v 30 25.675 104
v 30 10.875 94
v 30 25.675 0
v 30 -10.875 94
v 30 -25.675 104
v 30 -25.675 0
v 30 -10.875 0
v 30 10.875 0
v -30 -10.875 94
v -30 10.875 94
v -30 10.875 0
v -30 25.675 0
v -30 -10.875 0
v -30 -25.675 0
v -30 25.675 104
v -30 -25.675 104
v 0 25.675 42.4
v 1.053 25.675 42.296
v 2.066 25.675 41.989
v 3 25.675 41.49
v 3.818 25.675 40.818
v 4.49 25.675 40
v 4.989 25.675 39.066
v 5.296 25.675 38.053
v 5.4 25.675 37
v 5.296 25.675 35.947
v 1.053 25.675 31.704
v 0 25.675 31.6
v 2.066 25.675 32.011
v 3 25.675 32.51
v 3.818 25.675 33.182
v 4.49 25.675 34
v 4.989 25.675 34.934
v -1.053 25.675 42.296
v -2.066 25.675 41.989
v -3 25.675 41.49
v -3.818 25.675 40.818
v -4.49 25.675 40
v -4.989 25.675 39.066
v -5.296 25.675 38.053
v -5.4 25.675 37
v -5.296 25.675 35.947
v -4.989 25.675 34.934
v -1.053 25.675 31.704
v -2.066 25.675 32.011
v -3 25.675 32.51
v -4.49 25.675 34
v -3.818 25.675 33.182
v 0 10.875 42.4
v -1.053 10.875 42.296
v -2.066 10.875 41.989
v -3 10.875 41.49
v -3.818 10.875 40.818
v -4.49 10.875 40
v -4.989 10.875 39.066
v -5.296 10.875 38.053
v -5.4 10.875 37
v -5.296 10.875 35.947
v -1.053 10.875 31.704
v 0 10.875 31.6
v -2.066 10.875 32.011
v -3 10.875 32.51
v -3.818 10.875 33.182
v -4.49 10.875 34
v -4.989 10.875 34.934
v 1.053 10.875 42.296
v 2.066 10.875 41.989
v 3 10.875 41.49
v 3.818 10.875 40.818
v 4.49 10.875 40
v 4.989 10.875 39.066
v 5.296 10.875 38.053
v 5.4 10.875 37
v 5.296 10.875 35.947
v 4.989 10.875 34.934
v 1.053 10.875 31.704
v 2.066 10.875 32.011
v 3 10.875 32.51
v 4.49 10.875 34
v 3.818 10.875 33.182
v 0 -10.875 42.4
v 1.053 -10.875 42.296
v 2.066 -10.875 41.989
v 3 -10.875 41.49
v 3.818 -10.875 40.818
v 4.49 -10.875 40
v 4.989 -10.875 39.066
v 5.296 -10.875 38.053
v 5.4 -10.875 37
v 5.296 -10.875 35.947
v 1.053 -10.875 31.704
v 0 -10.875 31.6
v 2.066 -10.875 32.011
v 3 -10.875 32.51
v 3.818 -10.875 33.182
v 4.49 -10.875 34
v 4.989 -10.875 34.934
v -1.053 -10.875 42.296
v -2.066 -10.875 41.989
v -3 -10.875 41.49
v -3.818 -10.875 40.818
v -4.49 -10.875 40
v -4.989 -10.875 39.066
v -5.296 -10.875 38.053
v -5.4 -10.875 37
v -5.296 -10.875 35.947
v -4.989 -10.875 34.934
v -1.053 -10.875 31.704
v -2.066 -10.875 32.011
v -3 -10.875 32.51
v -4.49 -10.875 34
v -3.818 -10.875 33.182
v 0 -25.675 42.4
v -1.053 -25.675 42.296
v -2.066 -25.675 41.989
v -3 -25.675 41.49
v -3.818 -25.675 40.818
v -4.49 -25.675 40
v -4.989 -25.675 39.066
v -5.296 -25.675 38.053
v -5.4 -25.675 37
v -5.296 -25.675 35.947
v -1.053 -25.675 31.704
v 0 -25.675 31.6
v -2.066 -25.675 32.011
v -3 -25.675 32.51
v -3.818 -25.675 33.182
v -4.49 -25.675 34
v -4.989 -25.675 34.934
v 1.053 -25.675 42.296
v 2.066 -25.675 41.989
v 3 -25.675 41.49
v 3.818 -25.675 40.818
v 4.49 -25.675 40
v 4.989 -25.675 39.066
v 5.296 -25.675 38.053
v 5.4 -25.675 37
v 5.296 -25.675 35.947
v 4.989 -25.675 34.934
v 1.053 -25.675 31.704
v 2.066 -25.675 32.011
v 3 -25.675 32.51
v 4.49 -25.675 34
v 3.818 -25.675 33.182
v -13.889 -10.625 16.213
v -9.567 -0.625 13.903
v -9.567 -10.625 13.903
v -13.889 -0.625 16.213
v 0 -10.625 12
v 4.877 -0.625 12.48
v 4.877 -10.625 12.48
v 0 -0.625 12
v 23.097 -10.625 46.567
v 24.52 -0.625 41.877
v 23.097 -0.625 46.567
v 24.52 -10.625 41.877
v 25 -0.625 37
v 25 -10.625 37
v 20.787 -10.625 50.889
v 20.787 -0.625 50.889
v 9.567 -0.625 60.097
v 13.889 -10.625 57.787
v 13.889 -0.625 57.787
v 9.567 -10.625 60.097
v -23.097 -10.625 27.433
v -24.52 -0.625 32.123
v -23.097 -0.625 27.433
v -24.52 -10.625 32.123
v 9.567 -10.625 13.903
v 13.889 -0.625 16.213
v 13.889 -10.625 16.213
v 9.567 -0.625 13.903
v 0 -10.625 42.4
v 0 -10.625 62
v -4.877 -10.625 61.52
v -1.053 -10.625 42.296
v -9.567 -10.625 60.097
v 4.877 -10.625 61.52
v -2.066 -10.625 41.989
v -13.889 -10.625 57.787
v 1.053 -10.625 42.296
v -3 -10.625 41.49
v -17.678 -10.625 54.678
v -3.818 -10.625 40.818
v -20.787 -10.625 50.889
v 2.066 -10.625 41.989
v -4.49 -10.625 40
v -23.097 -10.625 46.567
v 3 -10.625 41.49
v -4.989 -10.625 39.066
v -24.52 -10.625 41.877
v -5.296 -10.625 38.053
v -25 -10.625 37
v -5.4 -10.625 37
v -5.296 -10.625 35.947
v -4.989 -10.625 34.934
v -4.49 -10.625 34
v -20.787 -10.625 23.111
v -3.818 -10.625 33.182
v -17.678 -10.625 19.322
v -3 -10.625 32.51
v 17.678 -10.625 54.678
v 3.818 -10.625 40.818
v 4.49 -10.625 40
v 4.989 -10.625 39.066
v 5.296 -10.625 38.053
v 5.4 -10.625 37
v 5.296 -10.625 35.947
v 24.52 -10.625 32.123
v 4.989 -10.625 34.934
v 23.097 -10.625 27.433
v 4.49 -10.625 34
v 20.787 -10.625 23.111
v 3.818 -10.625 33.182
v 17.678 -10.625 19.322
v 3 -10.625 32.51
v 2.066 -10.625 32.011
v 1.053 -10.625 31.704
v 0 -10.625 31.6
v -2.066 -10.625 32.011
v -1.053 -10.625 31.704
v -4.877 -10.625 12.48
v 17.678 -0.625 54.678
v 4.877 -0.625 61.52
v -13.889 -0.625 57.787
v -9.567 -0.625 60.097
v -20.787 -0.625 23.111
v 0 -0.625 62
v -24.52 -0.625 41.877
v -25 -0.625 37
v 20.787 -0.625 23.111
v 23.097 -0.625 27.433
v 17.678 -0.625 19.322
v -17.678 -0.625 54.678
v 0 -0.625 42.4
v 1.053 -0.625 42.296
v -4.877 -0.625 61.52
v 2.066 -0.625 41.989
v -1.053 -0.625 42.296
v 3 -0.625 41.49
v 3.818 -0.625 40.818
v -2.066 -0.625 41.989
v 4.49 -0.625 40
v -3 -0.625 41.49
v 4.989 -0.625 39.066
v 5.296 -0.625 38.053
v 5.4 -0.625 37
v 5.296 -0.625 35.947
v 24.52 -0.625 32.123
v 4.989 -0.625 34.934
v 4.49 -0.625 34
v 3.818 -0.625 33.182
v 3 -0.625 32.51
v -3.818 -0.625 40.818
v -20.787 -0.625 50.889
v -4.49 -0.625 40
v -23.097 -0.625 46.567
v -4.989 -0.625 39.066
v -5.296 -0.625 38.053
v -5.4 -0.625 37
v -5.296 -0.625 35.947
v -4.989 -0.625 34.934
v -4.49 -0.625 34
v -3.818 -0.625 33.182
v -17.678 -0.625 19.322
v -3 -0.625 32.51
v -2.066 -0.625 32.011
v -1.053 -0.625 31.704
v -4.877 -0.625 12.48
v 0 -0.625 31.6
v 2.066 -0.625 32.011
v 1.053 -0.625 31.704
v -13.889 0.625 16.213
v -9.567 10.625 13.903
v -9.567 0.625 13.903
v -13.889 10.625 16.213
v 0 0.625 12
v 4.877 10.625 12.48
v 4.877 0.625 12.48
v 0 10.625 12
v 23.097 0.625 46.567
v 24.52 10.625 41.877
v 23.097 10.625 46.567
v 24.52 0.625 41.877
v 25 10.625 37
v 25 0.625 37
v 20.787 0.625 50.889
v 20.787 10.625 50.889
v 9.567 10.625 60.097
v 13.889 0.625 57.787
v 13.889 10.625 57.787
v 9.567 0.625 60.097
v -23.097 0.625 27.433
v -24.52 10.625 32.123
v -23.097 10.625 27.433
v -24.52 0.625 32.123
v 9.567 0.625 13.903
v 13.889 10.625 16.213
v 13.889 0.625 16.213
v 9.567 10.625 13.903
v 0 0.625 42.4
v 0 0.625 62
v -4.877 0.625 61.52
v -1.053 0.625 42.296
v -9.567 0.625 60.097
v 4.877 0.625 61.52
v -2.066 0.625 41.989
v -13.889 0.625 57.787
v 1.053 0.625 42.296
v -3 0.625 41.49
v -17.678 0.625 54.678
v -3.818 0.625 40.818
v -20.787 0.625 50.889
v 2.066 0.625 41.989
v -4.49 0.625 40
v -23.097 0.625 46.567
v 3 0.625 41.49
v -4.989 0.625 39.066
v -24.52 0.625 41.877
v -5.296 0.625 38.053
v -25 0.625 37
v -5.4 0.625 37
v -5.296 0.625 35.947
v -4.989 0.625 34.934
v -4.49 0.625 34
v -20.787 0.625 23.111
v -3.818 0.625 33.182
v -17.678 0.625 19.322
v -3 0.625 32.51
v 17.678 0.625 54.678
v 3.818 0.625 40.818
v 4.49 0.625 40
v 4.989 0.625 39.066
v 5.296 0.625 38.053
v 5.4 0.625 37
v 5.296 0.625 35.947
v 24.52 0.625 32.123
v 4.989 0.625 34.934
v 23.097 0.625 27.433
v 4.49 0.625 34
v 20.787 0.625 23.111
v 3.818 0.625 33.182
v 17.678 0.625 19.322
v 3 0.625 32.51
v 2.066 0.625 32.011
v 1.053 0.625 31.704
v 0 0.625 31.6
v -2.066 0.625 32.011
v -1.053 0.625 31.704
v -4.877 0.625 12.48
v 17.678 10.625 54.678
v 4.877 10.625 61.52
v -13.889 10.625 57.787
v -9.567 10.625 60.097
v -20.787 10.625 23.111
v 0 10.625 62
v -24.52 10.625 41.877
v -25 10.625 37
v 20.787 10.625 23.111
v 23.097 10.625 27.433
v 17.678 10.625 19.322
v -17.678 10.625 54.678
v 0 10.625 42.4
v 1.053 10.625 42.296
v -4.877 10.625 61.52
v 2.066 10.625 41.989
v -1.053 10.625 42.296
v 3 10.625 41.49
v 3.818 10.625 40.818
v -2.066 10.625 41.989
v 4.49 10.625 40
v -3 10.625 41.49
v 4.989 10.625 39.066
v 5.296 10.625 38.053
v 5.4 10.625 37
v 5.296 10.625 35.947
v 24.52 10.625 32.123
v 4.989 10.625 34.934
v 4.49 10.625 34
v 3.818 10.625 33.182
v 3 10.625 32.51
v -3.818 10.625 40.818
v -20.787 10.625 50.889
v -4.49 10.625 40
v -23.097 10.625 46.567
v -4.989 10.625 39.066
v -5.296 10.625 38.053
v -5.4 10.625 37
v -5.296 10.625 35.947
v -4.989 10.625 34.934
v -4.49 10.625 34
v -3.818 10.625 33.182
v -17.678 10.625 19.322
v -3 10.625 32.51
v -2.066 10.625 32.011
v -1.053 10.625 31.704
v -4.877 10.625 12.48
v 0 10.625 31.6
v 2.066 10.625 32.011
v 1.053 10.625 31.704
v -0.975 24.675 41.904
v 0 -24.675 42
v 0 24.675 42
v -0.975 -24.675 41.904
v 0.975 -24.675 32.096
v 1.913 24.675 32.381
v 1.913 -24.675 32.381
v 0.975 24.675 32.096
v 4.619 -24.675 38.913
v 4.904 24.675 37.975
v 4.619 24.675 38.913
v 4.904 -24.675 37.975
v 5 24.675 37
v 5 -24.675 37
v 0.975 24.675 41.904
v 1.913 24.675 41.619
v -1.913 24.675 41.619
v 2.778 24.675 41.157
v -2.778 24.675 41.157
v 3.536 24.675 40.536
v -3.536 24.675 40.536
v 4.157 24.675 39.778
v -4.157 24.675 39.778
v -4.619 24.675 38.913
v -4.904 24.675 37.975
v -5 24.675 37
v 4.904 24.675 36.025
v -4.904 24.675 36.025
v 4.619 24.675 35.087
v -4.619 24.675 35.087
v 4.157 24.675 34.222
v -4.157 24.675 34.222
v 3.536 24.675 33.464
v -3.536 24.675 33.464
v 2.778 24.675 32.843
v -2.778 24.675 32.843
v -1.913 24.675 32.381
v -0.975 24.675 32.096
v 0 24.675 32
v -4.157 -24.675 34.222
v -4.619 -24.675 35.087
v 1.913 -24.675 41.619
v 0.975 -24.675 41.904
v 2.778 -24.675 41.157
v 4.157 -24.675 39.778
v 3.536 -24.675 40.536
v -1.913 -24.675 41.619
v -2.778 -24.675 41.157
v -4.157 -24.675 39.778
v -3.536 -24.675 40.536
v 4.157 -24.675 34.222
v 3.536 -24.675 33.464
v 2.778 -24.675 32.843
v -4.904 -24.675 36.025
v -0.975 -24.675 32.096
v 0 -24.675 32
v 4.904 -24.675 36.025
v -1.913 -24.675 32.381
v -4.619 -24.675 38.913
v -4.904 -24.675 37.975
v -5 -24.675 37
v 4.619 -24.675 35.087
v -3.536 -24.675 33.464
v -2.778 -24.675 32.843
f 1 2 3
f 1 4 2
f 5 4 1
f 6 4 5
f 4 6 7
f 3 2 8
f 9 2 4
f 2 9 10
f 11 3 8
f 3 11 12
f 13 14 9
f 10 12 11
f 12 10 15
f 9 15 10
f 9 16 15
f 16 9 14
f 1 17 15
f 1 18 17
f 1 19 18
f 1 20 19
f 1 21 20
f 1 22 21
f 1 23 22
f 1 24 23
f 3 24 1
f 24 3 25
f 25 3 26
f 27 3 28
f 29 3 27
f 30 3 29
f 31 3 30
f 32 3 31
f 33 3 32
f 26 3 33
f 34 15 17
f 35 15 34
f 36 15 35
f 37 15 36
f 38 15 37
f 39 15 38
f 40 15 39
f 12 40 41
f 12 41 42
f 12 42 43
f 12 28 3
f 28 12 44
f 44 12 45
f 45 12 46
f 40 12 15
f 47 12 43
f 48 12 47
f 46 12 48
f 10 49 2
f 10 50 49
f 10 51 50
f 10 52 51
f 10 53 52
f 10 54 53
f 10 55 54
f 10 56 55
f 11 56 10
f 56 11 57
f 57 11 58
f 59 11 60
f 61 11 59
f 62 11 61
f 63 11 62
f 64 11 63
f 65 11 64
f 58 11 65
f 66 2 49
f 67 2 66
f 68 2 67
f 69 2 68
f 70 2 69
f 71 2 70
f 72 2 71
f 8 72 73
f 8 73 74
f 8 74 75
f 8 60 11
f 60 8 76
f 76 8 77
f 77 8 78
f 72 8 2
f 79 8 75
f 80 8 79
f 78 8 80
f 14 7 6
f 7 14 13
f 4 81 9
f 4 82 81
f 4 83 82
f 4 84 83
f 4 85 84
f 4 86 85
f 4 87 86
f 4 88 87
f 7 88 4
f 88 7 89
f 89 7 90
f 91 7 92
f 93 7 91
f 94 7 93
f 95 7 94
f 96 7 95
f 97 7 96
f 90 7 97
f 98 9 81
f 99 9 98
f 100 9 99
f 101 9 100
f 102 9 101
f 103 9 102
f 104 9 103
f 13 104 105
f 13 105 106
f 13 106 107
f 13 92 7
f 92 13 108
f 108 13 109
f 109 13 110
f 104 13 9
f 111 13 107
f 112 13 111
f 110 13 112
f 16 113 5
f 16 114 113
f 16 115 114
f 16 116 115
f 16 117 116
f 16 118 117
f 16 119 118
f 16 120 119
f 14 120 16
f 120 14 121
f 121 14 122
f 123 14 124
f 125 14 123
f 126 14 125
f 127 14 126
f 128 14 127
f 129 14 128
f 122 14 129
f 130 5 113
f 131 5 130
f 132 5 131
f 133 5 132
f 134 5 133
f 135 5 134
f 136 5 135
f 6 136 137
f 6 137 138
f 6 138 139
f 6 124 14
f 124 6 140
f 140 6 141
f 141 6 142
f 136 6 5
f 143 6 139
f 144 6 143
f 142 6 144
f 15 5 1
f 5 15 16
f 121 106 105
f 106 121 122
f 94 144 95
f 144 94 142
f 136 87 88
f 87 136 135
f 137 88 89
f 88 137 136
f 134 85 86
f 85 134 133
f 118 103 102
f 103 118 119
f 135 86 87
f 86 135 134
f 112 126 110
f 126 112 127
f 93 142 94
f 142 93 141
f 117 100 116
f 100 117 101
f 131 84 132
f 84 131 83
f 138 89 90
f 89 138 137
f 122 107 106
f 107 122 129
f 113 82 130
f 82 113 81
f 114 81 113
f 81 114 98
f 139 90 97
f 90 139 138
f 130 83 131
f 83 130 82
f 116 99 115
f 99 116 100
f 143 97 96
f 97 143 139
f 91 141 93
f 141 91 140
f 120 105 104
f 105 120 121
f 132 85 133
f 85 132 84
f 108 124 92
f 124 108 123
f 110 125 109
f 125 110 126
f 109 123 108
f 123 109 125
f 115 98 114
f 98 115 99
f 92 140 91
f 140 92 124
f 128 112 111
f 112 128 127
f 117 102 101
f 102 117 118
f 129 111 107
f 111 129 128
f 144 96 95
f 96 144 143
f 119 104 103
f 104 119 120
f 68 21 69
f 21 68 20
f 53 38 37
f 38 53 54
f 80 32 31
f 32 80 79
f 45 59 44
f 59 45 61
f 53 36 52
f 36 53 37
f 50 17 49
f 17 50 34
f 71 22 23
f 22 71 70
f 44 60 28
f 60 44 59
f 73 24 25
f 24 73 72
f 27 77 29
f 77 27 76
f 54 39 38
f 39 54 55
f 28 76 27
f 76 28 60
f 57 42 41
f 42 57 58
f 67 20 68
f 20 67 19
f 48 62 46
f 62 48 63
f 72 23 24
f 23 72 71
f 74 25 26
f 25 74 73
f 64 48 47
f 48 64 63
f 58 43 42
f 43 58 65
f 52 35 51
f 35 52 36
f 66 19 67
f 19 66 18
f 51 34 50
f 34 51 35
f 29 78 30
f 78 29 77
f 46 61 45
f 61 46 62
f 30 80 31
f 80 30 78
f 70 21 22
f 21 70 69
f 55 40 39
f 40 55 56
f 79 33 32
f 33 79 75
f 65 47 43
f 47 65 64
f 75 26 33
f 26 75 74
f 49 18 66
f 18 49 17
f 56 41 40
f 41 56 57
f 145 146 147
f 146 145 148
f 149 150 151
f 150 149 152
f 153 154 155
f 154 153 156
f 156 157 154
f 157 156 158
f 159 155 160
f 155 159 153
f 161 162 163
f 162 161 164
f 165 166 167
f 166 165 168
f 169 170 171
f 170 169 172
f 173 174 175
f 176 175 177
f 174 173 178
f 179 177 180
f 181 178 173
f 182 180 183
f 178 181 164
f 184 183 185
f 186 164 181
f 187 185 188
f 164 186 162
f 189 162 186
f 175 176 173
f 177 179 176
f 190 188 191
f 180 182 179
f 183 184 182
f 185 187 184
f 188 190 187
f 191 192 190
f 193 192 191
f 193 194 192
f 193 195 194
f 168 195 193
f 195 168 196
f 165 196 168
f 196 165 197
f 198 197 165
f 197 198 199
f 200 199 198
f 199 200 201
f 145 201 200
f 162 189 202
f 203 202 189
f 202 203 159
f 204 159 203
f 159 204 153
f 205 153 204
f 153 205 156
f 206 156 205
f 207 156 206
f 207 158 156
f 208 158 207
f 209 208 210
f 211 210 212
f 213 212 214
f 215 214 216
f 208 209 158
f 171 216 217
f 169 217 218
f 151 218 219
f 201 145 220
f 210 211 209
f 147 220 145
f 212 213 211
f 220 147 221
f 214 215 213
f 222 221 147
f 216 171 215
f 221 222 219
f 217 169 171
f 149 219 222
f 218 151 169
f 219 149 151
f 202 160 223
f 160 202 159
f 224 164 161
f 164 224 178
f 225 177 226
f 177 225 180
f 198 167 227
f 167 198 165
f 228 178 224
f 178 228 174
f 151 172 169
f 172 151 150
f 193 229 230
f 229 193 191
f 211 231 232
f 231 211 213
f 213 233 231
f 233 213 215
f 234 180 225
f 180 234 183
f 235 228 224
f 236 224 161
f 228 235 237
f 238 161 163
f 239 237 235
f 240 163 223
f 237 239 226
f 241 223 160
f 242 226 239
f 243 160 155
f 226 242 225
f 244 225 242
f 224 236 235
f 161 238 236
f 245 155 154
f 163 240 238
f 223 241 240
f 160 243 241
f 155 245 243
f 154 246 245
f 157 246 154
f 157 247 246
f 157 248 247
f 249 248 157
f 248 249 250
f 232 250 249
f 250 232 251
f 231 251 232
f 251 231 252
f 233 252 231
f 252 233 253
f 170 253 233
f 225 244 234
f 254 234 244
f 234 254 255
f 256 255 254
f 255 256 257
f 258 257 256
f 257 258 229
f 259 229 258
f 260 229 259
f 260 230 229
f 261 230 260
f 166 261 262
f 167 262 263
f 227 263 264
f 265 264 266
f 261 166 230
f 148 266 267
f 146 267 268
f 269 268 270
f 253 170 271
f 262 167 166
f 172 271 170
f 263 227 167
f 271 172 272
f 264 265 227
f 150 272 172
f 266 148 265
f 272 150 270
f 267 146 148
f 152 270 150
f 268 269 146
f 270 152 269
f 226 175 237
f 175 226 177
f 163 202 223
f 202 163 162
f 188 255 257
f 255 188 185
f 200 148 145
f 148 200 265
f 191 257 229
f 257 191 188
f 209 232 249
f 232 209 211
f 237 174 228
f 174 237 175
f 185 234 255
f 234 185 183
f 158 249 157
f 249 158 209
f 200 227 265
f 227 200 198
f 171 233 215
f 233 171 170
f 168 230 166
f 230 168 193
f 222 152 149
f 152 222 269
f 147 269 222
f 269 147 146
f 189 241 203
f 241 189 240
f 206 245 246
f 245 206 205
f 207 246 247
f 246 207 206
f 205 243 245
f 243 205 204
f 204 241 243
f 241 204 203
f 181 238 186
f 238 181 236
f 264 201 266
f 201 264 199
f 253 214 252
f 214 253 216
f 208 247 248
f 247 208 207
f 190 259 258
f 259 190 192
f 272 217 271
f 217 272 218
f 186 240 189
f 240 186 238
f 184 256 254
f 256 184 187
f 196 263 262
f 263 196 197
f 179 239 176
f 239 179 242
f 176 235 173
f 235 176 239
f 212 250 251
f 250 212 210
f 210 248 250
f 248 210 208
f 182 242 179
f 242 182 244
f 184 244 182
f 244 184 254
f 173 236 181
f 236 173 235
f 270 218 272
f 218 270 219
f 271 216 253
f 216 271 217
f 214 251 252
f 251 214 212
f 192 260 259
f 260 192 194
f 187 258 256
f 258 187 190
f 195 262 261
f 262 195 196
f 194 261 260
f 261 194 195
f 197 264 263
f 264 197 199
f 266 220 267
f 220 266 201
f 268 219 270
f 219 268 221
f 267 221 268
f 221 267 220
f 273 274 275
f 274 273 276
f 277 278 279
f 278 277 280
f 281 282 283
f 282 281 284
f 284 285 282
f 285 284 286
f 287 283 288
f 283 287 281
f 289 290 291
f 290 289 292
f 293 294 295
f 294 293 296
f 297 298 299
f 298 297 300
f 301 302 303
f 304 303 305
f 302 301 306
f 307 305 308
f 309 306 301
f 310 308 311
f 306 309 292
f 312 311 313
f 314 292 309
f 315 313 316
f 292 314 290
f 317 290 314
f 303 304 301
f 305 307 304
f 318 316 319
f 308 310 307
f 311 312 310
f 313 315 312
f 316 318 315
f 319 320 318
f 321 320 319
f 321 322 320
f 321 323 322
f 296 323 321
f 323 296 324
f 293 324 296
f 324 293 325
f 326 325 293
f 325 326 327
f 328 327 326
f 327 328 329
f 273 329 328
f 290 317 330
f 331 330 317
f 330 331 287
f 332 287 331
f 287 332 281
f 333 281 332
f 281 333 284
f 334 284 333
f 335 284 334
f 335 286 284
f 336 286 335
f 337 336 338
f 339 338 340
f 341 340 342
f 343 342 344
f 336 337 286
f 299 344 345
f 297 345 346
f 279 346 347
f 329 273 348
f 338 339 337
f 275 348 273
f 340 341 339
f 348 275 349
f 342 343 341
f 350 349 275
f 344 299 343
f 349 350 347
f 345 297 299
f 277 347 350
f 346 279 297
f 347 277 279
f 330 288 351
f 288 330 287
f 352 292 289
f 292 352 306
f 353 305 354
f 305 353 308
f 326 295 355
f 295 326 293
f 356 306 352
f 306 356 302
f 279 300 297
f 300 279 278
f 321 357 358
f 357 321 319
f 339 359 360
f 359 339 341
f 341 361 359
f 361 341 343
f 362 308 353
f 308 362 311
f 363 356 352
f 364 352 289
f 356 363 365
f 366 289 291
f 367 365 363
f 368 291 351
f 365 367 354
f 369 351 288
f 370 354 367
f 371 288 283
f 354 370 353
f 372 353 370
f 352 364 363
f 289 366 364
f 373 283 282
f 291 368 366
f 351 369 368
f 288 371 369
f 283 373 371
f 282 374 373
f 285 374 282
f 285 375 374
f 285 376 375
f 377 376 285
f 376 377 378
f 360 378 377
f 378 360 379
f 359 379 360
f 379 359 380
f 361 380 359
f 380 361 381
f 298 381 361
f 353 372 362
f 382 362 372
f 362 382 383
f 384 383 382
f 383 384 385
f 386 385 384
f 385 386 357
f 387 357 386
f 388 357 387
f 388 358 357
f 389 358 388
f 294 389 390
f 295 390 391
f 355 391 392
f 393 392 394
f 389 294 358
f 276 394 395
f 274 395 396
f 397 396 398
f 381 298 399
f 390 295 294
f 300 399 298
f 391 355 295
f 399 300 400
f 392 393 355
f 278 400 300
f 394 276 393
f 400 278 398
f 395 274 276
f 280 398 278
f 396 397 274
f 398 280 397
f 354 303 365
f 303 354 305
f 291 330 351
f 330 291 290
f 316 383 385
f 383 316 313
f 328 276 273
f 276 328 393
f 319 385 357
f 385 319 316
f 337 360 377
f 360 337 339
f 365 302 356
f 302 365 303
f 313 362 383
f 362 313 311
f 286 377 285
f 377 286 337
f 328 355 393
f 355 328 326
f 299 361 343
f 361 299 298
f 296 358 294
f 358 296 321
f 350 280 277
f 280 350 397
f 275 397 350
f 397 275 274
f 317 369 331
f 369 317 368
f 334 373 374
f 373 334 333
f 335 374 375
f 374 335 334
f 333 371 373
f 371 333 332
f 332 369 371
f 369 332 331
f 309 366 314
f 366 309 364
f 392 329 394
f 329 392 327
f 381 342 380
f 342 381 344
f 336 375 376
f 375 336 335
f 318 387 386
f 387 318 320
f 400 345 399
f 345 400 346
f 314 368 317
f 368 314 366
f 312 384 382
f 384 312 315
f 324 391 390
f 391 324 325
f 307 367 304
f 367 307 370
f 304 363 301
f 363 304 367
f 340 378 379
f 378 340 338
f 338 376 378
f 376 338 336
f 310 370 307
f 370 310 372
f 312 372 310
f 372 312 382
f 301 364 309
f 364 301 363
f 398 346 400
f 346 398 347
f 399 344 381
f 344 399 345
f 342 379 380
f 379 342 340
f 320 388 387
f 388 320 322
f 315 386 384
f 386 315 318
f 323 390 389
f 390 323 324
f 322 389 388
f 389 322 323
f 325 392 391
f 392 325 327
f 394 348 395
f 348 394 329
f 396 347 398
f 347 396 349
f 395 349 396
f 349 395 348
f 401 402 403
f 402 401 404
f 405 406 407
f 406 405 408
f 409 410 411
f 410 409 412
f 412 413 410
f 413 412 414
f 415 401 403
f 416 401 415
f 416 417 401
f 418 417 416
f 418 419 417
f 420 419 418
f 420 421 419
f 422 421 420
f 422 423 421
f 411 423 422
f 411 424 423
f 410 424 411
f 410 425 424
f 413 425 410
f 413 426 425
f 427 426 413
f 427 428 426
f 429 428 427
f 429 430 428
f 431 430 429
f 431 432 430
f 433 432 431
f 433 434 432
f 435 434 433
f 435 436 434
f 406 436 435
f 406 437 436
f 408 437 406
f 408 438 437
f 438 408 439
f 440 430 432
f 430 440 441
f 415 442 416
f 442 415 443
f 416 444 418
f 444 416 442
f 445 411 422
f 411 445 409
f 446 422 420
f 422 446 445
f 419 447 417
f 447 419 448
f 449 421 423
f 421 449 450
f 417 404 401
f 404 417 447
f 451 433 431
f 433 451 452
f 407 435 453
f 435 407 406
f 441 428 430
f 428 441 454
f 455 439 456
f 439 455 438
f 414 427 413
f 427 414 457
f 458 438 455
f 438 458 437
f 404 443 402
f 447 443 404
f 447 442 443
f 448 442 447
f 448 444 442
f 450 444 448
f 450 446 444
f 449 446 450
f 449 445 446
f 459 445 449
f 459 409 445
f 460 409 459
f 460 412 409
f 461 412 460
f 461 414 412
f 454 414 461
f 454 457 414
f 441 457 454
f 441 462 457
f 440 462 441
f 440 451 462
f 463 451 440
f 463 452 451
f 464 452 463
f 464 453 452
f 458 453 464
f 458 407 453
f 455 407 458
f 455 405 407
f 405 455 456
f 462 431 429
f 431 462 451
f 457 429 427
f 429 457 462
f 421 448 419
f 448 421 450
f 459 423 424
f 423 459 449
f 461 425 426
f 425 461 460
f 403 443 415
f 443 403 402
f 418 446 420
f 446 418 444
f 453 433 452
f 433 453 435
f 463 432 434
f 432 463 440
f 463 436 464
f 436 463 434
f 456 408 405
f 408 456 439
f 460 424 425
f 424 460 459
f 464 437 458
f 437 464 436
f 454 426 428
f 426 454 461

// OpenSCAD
$fn = 32;

// ------------------------------------------------------------------------
// Trolley wheel set: wheels d50, fork 94 mm tall
// Every part is its own module, assembly() places every instance.
// ------------------------------------------------------------------------

// --- part 1 ---
module trolley_fork() {
  difference() {
    union() {
      translate([-30, 10.875, 0]) cube([60, 14.8, 94]);
      translate([-30, -25.675, 0]) cube([60, 14.8, 94]);
      translate([-30, -25.675, 94]) cube([60, 51.35, 10]);
    }
    translate([0, -18.275, 37]) rotate([90, 0, 0]) cylinder(h = 16.8, d = 10.8, center = true);
    translate([0, 18.275, 37]) rotate([90, 0, 0]) cylinder(h = 16.8, d = 10.8, center = true);
  }
}

// --- part 2 ---
module trolley_wheel() {
  difference() {
      translate([0, 0, 0]) cylinder(h = 10, d = 50);
      translate([0, 0, -1]) cylinder(h = 12, d = 10.8);
    }
}

// --- part 3 ---
module trolley_axle() {
  translate([0, 0, -24.675]) cylinder(h = 49.35, d = 10);
}

// --- assembly ---
module assembly() {
  color([0.80, 0.24, 0.20]) translate([0, 0, 0]) rotate([0, 0, 0]) trolley_fork();
  color([0.20, 0.45, 0.75]) translate([0, -0.625, 37]) rotate([90, 0, 0]) trolley_wheel();
  color([0.25, 0.62, 0.32]) translate([0, 10.625, 37]) rotate([90, 0, 0]) trolley_wheel();
  color([0.92, 0.70, 0.18]) translate([0, 0, 37]) rotate([90, 0, 0]) trolley_axle();
}

assembly();
